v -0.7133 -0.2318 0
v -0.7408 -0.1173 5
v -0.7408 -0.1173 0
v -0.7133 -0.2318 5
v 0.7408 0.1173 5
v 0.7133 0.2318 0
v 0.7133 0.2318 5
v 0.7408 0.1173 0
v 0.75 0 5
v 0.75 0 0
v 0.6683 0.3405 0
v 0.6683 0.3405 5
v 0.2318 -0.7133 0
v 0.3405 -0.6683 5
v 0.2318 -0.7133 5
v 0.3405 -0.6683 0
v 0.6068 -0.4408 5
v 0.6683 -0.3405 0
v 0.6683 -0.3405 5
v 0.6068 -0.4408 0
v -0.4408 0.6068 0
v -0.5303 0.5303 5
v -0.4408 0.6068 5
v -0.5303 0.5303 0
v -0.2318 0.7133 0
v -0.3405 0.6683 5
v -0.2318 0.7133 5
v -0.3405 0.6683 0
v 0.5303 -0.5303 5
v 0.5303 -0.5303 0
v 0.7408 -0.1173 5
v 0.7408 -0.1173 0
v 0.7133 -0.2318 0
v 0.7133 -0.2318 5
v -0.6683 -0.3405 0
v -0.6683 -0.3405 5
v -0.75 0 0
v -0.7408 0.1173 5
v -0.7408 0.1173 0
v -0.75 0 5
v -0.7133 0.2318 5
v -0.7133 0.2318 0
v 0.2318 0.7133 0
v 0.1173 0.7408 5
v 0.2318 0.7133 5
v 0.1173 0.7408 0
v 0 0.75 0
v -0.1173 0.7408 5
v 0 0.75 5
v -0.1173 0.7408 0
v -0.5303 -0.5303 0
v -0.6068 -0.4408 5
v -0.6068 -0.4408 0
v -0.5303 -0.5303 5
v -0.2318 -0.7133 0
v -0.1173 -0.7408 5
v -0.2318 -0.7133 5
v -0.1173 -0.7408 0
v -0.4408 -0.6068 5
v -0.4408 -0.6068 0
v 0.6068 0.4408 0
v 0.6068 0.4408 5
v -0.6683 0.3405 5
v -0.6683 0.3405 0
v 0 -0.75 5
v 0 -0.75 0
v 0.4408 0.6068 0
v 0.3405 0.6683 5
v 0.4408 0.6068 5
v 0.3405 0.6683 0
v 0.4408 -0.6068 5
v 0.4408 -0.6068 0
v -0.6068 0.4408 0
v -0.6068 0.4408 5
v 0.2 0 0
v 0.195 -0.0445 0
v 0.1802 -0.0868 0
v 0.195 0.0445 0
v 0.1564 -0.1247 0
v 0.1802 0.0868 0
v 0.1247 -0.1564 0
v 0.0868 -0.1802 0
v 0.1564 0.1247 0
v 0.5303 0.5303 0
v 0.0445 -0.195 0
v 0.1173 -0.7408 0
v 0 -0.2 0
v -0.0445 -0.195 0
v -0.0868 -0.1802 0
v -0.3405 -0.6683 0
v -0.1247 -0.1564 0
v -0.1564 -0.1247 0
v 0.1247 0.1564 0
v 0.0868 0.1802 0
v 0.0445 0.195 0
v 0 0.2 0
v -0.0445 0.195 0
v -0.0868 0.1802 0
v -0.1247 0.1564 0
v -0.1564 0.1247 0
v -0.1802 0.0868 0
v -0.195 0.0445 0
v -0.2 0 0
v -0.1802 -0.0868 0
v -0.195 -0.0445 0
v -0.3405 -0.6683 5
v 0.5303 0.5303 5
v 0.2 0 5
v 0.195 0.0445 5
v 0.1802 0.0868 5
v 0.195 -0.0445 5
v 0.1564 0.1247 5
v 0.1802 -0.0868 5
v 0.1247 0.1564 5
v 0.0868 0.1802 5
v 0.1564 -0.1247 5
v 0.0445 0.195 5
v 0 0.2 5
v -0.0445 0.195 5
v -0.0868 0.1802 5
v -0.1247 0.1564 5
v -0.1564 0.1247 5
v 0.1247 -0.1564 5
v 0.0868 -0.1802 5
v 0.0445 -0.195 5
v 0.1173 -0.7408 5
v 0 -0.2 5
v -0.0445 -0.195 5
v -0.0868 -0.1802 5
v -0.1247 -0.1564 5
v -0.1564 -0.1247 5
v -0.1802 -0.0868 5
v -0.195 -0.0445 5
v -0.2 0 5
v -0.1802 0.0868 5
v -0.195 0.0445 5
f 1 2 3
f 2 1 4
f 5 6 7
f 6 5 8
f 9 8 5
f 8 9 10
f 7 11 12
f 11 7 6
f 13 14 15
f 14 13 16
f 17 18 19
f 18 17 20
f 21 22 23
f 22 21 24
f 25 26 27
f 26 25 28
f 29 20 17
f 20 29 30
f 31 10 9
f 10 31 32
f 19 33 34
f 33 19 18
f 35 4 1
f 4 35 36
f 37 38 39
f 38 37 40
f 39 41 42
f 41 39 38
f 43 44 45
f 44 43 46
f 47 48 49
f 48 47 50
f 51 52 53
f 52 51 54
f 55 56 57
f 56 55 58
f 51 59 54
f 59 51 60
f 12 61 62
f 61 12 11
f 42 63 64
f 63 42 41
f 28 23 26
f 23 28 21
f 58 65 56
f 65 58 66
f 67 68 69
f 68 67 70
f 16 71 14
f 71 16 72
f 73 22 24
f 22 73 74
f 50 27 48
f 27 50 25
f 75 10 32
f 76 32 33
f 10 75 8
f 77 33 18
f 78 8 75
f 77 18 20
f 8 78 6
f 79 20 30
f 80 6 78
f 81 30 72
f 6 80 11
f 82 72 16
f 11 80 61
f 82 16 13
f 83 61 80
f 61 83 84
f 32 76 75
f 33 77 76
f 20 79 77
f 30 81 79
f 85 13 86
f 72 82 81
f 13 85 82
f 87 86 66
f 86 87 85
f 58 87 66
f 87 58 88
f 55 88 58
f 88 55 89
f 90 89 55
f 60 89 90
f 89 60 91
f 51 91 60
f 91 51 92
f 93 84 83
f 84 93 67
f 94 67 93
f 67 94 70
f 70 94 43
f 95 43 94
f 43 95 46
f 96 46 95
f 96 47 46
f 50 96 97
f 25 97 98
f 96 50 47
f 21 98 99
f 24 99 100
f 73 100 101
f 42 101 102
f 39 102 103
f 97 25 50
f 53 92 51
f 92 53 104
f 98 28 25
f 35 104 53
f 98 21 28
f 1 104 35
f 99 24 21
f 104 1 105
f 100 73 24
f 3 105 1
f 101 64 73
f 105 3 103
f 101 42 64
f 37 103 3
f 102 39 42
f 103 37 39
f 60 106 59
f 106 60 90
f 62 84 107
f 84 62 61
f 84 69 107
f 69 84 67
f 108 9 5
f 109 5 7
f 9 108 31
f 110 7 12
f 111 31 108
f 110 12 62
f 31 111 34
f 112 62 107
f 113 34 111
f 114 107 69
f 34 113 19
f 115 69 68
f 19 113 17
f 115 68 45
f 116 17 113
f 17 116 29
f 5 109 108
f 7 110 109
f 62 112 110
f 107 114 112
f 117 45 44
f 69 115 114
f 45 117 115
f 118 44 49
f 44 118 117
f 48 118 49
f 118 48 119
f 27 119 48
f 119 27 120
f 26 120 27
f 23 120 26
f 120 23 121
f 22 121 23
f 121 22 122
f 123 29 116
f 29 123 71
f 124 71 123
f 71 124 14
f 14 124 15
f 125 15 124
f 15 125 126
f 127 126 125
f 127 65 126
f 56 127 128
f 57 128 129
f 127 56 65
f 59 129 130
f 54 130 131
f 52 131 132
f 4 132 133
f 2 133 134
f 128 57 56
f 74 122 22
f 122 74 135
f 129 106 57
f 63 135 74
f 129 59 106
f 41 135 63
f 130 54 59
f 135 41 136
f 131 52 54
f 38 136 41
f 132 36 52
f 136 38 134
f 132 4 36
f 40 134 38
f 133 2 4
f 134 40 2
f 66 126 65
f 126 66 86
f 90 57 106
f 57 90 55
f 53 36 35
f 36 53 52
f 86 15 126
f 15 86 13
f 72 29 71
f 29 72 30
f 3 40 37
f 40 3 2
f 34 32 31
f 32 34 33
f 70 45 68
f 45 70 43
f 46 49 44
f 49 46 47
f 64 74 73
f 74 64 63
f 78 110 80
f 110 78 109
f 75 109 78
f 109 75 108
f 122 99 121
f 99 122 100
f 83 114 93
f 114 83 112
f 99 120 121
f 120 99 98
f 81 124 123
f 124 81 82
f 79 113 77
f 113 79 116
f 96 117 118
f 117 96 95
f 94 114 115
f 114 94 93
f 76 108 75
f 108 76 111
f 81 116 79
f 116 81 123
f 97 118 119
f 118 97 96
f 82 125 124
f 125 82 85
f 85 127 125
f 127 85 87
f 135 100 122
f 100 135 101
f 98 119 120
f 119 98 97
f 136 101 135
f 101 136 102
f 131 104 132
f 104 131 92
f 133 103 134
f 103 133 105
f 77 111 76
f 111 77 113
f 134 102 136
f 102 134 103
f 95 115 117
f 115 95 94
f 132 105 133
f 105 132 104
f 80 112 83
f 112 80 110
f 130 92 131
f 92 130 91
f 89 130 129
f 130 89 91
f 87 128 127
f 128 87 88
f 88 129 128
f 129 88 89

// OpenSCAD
// part_id: b14
// name: B14 sleeve
// source_drawing_ids: DRW-002
// units: mm
// revision: 0.1
// SPDX-License-Identifier: MIT

module part_b14(outer_d = 1.5, bore_d = 0.4, h = 5.0) {
    difference() {
        cylinder(d = outer_d, h = h, center = false, $fn = 40);
        translate([0, 0, -0.1])
            cylinder(d = bore_d, h = h + 0.2, center = false, $fn = 28);
    }
}

// ---- "main guard" ----
// Default to previewing when opened directly:
if (is_undef(__LIB_MODE__)) {
    part_b14();
}
